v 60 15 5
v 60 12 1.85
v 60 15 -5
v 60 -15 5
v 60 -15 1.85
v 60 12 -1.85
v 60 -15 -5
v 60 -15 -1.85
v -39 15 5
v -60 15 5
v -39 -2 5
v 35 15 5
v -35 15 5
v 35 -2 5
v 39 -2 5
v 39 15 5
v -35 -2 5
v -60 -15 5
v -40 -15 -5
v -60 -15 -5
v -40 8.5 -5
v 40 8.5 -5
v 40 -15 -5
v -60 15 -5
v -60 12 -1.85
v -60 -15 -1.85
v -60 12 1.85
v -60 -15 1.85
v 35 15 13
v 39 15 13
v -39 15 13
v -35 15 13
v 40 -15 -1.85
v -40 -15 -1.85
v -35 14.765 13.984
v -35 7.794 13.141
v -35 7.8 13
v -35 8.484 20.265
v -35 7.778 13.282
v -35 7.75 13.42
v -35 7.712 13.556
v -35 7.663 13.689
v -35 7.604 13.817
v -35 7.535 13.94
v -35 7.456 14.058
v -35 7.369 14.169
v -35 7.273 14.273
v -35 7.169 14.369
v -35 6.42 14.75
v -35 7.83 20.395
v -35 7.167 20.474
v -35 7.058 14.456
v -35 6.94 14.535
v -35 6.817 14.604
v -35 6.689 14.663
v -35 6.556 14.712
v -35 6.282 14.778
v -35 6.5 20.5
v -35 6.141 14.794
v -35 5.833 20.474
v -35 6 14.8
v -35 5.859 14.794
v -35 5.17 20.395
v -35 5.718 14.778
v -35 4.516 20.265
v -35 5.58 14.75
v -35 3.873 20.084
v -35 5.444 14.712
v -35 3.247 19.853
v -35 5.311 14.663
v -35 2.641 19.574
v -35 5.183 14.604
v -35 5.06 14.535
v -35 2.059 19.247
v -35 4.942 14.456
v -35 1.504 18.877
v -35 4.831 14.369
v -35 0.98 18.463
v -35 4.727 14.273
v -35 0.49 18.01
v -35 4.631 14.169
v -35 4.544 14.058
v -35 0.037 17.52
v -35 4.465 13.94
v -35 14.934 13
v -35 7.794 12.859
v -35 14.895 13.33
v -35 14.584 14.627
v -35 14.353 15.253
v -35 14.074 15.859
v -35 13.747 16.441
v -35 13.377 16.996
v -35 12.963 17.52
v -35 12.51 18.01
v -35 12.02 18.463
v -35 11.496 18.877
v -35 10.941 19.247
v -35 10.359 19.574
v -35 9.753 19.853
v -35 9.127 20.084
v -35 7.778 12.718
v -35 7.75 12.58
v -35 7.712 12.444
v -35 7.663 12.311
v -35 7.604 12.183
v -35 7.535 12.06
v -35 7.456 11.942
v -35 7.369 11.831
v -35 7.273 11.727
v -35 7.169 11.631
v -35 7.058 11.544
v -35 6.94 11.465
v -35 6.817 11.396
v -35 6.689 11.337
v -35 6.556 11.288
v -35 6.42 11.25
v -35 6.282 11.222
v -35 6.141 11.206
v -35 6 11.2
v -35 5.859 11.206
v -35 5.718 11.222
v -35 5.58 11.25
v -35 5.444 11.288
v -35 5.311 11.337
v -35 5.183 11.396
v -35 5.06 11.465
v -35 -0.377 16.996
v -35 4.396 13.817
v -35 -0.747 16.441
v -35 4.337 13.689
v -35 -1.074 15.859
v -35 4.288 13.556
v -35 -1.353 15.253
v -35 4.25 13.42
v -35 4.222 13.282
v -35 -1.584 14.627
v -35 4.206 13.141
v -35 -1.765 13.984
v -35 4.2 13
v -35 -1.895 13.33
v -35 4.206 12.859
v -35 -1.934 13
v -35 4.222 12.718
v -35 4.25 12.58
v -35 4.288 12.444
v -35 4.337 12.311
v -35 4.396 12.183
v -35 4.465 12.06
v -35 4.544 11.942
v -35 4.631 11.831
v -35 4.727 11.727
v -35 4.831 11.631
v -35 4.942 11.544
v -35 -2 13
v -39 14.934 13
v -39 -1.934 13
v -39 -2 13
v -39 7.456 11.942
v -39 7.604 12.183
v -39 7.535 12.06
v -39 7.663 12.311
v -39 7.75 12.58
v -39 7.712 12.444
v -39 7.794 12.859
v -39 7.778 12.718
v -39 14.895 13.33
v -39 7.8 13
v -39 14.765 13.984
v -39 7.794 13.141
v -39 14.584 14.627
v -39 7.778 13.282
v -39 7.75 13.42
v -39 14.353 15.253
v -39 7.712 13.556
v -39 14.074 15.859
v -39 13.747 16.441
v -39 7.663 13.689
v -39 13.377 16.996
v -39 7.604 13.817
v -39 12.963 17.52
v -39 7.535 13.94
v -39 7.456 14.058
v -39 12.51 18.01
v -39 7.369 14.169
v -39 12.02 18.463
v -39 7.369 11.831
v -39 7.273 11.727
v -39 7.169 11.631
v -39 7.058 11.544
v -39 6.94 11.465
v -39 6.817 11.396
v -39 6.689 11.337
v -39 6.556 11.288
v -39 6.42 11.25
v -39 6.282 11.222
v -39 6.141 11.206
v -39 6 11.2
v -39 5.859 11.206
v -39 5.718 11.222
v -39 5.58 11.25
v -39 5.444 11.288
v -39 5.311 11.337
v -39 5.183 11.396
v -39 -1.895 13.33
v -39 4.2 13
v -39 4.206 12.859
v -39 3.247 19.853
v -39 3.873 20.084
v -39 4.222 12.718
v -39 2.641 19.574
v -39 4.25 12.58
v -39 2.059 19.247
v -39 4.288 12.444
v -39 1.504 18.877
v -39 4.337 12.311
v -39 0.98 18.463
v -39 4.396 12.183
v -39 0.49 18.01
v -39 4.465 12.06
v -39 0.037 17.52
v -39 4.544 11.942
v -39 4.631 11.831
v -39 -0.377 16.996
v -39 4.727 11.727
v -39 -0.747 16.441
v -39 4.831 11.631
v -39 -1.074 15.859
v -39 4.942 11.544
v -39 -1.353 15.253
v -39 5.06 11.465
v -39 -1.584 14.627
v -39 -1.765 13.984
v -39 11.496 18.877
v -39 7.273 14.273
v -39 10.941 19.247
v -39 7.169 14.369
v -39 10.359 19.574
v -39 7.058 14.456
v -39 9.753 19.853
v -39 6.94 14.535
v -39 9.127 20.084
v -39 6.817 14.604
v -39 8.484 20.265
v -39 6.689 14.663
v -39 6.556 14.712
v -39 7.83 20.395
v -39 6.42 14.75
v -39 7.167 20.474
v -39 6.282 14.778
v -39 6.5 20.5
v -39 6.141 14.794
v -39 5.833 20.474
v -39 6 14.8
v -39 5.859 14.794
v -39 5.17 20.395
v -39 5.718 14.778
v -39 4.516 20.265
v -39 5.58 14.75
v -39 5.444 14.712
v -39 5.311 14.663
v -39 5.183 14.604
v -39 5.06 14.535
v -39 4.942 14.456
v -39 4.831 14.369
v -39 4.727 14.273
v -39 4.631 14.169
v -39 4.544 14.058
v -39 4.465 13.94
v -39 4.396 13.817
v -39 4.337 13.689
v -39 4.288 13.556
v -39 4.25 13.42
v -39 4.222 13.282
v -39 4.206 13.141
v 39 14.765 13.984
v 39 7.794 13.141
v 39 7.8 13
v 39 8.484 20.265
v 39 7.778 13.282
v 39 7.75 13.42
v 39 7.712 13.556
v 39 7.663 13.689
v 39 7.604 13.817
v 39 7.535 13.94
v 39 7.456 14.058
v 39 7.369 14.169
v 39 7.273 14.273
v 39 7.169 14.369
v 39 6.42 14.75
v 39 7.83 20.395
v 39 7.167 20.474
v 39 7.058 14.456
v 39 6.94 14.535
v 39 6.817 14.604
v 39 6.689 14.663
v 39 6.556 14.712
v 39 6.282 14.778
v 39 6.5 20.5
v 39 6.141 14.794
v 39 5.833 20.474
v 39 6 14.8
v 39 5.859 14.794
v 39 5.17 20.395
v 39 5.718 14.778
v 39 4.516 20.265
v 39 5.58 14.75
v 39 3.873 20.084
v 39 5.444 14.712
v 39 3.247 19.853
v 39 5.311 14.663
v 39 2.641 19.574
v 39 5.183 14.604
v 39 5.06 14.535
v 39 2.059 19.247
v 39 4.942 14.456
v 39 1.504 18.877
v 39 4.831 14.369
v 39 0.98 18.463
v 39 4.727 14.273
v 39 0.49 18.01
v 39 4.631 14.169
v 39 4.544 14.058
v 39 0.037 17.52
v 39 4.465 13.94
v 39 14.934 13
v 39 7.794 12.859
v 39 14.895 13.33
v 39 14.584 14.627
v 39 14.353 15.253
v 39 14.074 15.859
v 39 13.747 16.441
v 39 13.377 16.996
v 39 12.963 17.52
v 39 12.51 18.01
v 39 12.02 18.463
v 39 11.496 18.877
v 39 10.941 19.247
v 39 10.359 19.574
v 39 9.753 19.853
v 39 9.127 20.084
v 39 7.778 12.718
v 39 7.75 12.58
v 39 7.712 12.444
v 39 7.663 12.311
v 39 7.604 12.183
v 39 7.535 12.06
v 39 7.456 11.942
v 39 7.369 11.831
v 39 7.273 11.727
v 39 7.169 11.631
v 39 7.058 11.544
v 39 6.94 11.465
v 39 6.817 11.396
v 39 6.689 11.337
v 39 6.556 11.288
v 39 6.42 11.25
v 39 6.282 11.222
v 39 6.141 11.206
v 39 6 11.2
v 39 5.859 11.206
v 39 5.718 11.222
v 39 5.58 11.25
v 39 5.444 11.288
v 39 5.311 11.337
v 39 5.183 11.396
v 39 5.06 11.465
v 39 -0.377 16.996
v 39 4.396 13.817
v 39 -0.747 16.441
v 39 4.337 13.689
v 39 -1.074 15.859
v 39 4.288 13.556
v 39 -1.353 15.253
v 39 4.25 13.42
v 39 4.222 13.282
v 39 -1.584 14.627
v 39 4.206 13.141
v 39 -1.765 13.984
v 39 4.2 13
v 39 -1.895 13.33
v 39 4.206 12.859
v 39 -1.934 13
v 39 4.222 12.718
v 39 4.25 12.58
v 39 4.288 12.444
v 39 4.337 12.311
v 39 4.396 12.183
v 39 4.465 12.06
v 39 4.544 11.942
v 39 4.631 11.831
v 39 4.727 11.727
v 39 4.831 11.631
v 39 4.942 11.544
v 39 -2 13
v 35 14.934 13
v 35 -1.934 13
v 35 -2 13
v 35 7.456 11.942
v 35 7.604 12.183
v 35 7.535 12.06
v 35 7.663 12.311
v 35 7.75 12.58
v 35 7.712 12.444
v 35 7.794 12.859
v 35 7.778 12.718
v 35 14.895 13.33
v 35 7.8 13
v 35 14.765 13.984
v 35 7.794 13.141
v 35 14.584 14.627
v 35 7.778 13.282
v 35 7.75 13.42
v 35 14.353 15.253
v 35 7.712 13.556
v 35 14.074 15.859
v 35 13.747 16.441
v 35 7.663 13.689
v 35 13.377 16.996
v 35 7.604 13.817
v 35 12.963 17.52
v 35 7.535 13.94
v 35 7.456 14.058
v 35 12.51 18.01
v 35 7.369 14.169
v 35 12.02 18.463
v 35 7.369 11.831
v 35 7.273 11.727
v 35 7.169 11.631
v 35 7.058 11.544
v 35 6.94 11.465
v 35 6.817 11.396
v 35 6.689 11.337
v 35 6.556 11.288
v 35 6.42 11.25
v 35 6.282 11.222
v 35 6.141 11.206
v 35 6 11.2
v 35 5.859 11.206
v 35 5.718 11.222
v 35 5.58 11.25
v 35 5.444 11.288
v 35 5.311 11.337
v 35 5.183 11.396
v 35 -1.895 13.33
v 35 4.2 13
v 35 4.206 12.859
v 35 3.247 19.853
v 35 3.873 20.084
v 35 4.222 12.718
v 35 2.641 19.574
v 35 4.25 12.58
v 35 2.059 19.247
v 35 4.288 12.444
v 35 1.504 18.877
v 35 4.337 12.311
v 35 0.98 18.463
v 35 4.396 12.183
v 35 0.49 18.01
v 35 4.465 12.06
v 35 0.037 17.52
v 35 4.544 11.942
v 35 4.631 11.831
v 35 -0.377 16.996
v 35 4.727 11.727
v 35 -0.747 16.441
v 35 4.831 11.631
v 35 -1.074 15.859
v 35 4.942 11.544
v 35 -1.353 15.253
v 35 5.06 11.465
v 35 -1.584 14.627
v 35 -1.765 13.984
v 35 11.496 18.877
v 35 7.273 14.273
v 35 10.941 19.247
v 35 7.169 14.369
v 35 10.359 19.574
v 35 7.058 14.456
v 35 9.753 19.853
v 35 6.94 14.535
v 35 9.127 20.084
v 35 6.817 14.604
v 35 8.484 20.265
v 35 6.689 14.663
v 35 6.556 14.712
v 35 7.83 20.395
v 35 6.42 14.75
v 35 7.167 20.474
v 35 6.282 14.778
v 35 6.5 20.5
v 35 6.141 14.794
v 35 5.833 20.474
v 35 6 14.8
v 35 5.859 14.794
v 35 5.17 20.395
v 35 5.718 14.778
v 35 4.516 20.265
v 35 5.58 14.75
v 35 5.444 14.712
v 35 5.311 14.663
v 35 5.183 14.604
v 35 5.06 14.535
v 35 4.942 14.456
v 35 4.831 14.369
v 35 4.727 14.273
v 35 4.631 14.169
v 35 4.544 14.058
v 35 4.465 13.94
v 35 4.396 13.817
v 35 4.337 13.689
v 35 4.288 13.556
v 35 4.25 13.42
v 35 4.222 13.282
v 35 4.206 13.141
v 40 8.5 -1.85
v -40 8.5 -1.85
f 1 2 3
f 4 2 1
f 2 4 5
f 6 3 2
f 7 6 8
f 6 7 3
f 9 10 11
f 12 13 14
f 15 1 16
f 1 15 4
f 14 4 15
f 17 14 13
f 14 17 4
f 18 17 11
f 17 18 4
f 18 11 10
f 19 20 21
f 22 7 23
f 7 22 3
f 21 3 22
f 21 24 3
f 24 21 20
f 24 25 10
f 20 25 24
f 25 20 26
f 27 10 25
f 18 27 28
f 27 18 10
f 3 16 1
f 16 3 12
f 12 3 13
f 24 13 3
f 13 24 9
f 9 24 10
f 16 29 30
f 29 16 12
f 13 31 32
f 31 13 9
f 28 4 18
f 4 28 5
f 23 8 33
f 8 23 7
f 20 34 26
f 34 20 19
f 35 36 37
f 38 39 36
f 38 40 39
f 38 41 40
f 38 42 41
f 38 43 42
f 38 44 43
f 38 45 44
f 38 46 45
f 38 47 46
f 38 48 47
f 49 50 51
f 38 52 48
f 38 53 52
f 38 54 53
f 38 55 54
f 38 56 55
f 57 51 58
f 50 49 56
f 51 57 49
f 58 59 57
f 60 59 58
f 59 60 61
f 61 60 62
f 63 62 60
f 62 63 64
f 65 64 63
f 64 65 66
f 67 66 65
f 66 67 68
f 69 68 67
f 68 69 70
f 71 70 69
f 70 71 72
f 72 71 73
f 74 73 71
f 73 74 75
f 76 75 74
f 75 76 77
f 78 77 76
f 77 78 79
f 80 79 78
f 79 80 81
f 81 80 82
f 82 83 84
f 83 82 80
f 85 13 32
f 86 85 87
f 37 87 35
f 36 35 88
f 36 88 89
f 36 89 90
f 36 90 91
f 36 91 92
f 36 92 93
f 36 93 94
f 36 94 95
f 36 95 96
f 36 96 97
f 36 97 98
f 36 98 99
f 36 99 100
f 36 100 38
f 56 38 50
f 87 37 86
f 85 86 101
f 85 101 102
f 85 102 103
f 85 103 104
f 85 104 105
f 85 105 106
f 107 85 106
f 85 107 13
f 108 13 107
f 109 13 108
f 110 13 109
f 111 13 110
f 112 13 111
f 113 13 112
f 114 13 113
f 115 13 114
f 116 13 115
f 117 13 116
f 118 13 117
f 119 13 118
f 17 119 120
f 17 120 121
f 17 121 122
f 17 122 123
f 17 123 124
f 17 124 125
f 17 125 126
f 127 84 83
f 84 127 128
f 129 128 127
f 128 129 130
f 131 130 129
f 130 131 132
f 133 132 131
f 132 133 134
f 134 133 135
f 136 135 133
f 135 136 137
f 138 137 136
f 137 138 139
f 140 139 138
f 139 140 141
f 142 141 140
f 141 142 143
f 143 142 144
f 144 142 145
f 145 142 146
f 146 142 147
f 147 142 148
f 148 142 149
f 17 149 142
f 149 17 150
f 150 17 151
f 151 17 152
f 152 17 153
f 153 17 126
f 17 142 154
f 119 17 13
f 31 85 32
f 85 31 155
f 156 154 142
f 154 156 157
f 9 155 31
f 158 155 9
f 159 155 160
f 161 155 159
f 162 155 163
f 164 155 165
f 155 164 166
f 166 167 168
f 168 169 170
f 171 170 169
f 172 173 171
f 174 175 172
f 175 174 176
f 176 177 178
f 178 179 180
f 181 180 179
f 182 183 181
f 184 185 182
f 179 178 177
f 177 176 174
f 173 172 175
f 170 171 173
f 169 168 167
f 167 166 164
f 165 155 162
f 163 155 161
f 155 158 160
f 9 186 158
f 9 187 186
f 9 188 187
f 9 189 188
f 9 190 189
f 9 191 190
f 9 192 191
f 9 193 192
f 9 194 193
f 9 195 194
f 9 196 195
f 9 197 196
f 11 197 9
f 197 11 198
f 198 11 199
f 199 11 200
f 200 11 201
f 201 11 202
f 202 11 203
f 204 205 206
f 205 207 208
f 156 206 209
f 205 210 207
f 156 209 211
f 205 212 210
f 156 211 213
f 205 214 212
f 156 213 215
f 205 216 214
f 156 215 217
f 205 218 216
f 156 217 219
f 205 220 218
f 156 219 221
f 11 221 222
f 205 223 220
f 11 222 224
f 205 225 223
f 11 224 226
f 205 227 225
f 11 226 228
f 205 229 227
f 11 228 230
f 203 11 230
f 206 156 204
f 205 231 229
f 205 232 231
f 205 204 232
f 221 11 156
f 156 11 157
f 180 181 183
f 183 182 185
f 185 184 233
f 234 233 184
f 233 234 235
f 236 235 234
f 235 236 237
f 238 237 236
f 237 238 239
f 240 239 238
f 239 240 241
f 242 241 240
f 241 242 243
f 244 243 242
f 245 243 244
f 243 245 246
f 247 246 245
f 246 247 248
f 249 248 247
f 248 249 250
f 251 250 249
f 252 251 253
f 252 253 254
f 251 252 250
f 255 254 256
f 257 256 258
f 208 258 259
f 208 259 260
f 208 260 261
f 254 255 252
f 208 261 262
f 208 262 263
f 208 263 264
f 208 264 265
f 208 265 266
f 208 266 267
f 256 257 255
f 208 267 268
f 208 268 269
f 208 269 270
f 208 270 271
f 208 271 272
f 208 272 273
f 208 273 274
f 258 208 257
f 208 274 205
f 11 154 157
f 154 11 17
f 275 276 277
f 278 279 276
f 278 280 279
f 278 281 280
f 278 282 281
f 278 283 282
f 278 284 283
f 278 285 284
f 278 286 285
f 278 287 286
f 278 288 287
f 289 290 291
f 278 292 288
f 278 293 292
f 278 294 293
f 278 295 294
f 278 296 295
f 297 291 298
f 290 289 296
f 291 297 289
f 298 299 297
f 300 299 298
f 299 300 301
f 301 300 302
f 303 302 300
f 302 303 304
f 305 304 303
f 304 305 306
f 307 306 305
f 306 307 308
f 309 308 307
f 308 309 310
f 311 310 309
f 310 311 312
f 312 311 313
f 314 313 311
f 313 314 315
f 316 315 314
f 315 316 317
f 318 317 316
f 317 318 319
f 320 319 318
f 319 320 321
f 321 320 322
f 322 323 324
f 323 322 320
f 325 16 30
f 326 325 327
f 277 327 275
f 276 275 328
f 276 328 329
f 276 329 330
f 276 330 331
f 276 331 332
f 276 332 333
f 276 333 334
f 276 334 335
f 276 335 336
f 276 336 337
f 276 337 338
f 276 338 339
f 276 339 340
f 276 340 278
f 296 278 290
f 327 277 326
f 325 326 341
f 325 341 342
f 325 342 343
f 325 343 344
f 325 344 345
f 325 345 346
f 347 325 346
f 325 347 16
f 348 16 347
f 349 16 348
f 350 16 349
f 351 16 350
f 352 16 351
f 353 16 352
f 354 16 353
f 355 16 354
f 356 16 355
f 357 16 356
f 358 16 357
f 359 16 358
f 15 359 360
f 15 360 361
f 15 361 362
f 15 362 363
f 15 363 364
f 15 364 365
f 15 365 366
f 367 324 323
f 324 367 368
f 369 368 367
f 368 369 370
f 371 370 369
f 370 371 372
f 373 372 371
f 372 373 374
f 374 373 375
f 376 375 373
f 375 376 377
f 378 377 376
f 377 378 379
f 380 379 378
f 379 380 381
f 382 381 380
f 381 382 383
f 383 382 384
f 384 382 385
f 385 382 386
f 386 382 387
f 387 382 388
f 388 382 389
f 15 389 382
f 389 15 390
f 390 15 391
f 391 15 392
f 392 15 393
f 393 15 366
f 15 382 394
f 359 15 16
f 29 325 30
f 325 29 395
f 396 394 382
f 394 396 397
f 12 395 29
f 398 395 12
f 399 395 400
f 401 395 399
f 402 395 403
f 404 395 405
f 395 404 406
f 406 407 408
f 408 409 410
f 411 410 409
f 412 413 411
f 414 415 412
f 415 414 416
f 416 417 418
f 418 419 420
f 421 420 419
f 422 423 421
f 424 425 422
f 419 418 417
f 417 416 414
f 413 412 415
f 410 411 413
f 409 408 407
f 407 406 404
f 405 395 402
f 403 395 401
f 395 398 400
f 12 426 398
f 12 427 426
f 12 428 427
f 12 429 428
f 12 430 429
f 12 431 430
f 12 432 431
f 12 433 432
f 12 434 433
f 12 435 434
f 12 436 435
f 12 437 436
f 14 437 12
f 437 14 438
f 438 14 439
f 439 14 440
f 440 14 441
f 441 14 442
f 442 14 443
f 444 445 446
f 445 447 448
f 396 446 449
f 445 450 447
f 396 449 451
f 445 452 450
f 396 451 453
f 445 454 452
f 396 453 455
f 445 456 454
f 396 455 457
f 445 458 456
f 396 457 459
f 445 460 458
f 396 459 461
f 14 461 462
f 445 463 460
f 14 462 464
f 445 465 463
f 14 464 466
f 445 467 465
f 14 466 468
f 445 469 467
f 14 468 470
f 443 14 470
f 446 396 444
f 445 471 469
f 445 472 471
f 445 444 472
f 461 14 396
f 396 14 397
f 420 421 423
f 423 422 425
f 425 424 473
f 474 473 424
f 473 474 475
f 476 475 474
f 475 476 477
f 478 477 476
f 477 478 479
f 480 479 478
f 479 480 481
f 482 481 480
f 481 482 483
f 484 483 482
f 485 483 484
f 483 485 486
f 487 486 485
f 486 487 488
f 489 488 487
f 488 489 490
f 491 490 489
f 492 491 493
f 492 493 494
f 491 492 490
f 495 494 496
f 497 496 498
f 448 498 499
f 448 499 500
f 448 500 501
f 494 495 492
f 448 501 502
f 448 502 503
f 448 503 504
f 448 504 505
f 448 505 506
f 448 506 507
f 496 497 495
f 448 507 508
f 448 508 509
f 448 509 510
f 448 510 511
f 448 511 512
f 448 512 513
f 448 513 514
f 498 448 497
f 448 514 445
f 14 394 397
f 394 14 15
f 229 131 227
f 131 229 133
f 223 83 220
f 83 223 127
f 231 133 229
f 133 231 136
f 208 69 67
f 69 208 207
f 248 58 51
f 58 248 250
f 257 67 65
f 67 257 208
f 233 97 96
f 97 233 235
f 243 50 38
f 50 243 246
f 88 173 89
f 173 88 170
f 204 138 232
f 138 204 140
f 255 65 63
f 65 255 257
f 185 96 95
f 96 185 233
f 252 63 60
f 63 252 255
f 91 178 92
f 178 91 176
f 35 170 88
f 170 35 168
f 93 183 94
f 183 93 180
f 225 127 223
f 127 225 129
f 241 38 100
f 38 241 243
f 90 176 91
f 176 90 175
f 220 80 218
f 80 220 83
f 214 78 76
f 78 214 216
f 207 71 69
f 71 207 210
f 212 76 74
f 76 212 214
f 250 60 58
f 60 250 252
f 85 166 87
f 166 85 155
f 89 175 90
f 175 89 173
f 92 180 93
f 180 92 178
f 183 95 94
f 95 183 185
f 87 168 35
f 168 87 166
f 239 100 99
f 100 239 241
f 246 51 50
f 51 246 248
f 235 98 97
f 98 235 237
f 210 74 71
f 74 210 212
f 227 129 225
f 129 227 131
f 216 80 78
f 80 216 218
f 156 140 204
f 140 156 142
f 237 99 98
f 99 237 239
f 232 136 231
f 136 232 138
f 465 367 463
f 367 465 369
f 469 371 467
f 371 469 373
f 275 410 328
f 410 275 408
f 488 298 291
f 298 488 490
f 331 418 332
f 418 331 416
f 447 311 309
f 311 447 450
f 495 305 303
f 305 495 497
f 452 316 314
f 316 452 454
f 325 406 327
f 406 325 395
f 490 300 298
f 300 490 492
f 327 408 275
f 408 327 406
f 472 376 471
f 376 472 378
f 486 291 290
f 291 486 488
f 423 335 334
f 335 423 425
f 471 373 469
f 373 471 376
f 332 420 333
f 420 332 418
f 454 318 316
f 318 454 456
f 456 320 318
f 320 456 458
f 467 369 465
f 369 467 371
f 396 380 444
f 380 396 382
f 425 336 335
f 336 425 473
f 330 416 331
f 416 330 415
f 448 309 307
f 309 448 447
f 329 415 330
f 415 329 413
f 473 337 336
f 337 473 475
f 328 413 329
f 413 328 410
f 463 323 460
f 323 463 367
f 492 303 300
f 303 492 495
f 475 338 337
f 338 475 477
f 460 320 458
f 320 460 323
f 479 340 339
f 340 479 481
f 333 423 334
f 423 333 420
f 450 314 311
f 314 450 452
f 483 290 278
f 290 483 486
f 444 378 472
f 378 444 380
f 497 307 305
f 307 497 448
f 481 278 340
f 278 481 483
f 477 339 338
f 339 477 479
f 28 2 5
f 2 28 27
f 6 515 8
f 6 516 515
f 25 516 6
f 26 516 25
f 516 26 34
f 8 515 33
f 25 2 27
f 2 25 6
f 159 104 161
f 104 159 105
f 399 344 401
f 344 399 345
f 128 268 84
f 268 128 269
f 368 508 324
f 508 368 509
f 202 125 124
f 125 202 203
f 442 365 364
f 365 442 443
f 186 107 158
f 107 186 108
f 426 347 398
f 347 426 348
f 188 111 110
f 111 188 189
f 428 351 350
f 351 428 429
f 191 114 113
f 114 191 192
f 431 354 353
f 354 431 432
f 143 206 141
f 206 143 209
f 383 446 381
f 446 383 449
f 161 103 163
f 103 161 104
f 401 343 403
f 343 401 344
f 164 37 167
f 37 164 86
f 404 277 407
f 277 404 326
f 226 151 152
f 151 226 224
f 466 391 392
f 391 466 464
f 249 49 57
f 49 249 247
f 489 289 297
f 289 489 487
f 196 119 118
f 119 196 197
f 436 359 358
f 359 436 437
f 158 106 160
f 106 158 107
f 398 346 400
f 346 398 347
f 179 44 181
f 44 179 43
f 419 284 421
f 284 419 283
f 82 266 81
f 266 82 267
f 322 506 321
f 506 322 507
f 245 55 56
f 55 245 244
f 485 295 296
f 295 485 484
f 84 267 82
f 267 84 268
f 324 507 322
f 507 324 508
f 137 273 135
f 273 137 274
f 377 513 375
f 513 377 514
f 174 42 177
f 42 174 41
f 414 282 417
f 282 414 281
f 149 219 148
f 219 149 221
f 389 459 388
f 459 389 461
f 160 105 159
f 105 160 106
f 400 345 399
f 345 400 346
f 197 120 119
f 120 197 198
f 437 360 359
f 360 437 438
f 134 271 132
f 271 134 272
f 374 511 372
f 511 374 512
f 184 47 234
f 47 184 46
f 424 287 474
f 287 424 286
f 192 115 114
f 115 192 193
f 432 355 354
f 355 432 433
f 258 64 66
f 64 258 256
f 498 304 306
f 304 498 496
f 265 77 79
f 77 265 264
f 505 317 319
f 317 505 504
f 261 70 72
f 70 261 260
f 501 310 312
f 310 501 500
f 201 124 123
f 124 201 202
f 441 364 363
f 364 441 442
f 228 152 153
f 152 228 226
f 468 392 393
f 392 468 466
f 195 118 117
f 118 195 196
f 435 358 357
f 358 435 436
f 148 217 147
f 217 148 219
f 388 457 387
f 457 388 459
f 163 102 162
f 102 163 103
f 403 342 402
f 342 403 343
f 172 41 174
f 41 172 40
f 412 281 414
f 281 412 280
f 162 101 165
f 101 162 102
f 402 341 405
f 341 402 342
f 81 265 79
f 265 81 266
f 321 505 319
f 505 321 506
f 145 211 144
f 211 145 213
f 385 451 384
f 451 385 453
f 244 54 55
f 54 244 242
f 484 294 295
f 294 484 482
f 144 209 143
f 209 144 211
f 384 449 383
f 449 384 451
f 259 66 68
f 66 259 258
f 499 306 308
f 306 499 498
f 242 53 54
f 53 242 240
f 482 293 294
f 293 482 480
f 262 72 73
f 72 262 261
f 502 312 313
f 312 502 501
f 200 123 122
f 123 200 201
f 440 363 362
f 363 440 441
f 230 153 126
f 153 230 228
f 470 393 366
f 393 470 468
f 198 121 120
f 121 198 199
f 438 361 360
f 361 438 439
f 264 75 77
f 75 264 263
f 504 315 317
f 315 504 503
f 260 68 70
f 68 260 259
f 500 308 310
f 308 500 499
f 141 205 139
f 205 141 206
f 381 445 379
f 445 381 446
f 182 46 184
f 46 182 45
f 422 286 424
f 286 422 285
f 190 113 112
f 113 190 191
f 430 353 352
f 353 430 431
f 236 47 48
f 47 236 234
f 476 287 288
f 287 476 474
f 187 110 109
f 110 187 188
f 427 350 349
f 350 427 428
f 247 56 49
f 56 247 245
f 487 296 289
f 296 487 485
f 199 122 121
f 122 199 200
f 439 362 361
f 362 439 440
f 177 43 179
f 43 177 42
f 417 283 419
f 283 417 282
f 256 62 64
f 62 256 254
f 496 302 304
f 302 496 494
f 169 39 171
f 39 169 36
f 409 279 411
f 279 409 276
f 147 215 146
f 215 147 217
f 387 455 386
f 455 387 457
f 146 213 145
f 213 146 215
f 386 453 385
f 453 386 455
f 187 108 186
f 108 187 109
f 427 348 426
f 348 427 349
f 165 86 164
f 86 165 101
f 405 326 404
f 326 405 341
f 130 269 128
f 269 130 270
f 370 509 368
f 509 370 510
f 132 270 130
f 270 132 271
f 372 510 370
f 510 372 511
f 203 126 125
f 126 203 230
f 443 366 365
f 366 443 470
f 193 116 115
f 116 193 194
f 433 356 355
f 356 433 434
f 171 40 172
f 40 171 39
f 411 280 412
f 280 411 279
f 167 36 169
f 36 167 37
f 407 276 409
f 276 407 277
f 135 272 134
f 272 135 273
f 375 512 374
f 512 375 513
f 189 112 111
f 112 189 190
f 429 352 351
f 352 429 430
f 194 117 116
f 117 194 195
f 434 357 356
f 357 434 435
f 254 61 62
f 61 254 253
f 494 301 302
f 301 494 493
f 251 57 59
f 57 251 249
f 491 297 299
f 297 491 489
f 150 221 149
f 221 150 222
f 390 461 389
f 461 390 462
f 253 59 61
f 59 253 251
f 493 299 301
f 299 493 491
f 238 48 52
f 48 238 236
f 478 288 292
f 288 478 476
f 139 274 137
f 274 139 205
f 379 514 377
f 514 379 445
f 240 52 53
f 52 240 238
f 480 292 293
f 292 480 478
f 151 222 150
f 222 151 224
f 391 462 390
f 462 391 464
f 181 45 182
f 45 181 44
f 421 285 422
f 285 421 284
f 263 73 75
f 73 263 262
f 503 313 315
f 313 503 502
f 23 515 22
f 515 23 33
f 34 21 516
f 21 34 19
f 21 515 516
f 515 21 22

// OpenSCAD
// CREPP 2018
// GPL V3.0
// dranguy@yahoo.fr


difference () {
    
    union () {
        
        cube ([120,30,10], center=true);
        translate ([-37,6.5,8]) cube([4,17,10], center=true);
        translate([37,6.5,8]) cube([4,17,10], center=true);
        translate([-37,6.5,12]) rotate ([0,90,0]) cylinder (r= 8.5, h= 4, center=true,$fn=80);
        translate([37,6.5,12]) rotate ([0,90,0]) cylinder (r=8.5, h= 4, center=true, $fn=80);
        
        
        
        }
        
        translate([0,-2.5,0]) cube([122,29,3.7], center=true);
       translate([0,6,13]) rotate([0,90,0]) cylinder(r=1.8, h=80, center=true, $fn=80);
        translate([0,-4,-3]) cube([80,25,4.5], center=true);
    
}
